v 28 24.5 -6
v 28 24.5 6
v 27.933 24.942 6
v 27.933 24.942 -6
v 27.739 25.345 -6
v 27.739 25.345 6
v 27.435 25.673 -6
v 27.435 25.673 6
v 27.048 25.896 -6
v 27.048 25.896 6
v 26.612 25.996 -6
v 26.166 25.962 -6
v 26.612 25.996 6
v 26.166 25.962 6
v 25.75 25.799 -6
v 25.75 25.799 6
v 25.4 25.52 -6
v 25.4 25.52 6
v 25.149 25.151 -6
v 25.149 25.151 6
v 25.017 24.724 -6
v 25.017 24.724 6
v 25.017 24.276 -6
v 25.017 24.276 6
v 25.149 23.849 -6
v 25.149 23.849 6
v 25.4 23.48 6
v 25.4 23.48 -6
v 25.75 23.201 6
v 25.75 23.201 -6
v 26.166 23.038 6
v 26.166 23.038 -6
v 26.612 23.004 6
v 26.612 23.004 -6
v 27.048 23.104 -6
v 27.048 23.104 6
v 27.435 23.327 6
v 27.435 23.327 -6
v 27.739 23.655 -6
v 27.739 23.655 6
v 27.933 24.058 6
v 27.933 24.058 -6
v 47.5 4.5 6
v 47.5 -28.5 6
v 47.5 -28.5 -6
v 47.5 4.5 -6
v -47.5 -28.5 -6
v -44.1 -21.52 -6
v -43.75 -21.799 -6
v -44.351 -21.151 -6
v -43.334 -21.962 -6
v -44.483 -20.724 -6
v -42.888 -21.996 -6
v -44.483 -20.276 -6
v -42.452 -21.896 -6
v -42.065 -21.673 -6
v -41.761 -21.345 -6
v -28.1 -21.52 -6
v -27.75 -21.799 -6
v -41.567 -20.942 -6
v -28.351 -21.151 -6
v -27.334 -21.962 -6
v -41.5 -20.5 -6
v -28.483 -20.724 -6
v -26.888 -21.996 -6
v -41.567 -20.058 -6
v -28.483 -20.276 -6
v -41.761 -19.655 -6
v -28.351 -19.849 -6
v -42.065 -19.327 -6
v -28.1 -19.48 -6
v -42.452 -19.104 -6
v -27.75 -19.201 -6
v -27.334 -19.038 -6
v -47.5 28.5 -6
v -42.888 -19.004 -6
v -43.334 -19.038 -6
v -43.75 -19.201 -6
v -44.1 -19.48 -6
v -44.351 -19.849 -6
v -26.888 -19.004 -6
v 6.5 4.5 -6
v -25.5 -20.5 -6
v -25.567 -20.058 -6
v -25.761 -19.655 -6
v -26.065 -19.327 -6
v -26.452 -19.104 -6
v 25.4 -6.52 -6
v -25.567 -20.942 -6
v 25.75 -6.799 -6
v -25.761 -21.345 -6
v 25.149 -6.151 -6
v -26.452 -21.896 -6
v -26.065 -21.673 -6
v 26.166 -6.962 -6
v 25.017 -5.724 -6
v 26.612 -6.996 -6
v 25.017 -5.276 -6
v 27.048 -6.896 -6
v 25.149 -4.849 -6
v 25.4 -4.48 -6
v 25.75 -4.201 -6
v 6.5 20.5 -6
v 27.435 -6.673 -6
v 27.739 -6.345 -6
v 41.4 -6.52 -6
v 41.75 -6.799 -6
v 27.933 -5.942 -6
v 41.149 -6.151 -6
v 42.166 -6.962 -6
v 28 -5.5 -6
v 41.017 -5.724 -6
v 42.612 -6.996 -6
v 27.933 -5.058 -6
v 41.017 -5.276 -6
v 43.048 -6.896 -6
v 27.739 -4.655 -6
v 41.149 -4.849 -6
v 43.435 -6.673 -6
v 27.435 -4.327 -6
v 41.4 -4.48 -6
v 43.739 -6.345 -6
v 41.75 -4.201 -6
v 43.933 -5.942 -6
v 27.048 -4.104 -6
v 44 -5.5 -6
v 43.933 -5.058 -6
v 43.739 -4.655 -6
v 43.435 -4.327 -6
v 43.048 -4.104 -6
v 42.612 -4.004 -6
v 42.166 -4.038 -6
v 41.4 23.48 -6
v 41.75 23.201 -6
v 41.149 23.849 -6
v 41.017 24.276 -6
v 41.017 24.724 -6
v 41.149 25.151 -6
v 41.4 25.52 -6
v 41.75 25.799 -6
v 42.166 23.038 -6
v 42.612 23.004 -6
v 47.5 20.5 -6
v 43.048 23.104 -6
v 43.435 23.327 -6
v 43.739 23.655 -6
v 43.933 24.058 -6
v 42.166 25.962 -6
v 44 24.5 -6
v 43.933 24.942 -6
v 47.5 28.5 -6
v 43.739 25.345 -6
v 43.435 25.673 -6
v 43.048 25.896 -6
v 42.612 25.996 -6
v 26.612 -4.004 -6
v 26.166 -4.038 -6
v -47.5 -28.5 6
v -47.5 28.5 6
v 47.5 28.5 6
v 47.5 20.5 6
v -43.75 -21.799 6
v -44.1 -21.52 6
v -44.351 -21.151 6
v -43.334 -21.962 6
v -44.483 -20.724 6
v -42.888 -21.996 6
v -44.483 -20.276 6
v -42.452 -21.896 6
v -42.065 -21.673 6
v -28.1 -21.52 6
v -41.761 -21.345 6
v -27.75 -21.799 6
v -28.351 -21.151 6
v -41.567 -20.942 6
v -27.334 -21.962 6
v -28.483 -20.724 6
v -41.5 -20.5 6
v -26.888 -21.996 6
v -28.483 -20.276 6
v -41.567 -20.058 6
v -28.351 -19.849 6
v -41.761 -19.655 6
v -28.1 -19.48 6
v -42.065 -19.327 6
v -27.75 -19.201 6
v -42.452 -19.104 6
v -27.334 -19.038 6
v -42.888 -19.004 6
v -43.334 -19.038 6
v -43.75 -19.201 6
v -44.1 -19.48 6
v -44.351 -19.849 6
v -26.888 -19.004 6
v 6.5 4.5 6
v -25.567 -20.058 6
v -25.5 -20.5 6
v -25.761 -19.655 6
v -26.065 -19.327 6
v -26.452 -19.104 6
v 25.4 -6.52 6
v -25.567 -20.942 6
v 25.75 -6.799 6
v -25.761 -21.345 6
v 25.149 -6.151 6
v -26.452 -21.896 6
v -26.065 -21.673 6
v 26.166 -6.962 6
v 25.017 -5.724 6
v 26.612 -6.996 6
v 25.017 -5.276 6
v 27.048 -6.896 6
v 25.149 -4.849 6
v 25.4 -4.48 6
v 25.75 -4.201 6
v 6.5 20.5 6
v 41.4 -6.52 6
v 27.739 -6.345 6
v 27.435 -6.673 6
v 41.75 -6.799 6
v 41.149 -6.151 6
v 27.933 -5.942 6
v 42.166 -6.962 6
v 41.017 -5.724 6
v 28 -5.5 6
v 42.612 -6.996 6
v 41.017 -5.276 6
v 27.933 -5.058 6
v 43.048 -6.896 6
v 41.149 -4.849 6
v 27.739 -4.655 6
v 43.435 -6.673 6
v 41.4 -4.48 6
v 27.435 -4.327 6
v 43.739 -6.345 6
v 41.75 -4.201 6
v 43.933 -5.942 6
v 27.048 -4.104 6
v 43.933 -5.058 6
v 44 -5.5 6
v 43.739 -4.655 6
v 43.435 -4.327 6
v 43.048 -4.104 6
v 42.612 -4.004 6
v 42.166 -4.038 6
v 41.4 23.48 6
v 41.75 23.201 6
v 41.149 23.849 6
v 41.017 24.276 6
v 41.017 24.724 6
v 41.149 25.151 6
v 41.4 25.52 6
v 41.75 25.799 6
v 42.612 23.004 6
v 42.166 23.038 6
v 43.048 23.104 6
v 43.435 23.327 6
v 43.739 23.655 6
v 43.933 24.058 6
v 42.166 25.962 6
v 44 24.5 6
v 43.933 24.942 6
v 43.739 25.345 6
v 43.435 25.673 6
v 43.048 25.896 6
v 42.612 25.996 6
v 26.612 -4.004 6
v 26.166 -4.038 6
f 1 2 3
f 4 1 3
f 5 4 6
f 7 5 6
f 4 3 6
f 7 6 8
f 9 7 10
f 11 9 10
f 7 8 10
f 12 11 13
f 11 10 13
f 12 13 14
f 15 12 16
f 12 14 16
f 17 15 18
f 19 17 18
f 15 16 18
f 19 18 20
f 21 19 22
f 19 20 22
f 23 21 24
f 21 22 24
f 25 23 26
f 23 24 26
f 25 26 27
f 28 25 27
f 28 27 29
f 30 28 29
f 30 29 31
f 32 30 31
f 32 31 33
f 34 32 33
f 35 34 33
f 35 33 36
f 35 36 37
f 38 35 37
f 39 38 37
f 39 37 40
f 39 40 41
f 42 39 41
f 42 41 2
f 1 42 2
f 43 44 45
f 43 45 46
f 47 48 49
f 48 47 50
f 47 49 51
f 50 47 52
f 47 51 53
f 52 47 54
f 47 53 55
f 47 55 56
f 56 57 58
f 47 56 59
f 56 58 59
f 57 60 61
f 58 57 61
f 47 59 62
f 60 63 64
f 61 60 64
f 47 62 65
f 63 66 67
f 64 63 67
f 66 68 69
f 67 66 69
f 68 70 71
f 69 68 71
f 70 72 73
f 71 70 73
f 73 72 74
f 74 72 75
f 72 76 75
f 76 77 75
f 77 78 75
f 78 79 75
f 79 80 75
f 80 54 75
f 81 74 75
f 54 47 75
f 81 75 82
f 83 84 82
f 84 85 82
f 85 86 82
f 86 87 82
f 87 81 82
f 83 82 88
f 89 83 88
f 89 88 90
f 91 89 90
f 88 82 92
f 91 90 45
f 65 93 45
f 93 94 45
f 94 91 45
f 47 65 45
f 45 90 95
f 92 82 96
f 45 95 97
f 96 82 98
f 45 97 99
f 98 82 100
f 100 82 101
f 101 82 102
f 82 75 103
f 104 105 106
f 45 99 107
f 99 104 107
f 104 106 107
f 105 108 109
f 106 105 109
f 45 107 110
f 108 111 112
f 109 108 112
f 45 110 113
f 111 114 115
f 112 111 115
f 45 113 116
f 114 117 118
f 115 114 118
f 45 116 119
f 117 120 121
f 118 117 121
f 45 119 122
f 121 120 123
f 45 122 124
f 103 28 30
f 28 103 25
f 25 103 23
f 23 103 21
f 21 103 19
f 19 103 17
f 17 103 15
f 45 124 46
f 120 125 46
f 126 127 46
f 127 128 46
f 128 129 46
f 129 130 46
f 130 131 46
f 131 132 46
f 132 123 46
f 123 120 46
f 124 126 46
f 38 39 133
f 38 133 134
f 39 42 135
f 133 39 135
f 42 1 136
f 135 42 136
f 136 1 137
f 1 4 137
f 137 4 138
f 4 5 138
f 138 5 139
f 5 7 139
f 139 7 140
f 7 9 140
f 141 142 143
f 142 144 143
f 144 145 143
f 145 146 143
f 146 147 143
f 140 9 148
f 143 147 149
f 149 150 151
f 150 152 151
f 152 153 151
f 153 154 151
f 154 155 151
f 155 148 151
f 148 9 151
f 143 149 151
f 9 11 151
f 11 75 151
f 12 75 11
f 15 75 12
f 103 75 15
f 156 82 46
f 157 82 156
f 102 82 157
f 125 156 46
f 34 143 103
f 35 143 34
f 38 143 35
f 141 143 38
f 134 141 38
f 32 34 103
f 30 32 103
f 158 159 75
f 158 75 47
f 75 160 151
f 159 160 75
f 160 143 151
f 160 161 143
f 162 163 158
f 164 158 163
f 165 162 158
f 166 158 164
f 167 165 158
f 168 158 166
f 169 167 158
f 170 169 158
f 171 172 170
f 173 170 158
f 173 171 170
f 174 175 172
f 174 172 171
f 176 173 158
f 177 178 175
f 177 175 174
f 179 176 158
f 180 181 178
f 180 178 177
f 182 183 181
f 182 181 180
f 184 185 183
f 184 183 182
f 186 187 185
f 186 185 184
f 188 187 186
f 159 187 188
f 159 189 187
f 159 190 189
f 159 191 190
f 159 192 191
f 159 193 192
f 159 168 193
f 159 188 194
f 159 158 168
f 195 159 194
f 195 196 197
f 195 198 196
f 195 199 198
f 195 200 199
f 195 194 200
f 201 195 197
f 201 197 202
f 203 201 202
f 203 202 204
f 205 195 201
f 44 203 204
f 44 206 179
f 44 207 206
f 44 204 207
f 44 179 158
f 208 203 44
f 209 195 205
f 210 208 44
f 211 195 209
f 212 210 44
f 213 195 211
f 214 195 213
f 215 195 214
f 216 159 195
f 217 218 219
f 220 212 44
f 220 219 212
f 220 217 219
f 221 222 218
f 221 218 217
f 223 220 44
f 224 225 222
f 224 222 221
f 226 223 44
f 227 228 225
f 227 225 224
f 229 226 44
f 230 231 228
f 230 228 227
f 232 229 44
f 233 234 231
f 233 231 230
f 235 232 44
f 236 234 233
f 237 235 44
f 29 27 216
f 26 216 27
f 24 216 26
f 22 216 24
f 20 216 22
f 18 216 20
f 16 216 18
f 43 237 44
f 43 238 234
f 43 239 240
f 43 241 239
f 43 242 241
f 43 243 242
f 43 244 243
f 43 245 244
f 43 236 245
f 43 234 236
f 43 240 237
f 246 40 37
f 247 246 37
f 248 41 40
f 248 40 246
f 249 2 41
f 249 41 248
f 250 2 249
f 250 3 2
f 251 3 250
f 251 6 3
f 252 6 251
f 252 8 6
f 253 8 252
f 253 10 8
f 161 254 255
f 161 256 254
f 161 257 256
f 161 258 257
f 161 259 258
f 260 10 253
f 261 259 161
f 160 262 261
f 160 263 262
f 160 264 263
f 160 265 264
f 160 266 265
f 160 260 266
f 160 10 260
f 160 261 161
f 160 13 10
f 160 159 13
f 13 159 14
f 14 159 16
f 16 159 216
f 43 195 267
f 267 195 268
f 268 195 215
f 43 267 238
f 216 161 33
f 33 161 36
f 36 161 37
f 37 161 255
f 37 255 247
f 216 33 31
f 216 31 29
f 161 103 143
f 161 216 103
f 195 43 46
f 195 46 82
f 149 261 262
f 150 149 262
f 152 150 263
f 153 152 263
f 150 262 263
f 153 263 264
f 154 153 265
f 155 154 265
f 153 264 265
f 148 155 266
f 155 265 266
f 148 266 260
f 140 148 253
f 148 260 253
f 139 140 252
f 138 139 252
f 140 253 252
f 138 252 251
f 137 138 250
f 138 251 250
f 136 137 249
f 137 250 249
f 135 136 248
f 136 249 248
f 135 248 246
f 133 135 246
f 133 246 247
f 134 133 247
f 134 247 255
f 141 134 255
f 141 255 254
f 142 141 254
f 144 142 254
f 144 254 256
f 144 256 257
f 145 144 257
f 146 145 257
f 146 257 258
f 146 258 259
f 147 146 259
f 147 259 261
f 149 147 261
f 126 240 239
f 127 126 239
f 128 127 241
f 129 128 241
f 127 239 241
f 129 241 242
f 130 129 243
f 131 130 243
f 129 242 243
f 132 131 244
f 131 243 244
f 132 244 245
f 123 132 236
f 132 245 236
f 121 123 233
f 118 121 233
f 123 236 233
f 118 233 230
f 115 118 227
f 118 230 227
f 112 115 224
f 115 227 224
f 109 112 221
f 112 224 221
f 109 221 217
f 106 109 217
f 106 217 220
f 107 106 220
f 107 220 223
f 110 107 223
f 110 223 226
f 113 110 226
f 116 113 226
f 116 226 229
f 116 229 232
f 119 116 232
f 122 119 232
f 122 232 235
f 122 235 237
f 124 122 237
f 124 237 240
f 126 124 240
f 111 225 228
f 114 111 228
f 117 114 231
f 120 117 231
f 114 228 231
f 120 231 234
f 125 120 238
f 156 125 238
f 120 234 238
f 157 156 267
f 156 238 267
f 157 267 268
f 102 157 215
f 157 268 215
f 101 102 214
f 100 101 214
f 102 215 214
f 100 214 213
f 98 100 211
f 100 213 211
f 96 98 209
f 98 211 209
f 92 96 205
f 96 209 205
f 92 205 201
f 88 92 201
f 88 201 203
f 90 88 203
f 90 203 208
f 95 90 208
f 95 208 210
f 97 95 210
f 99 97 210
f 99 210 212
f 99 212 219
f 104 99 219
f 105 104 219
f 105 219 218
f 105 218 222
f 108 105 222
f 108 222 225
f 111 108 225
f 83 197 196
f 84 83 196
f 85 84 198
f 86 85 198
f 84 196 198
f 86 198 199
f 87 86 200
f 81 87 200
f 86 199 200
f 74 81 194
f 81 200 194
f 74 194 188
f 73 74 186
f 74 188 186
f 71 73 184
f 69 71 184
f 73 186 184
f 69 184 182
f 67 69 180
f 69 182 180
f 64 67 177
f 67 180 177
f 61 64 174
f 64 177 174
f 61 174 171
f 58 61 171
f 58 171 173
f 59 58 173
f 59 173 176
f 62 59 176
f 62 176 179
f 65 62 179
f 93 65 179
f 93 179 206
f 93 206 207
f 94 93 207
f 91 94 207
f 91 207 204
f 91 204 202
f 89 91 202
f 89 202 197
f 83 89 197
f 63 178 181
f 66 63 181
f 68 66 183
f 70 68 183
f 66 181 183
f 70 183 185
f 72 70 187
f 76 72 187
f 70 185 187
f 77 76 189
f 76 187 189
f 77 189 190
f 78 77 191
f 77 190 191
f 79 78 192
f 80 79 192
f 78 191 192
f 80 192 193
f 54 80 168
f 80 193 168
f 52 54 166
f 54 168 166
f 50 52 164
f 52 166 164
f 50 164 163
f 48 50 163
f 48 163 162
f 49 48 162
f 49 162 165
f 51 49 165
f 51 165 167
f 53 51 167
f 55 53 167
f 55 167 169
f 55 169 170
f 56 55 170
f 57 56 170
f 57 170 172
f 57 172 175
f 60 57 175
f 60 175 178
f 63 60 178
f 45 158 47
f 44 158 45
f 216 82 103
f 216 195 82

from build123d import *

# Parameters (mm, degrees)
F1_DEPTH = 6
F2_R     = 1.5
F3_DEPTH = 25


with BuildPart() as f1:
    # F0 (on Top) → F1 (new body, symmetric)
    with BuildSketch(Plane.XY):
        Polygon((47.5, 20.5), (47.5, 28.5), (-47.5, 28.5), (-47.5, -28.5), (47.5, -28.5), (47.5, 4.5), (6.5, 4.5), (6.5, 20.5), align=None)
    extrude(amount=F1_DEPTH, both=True)

    # F2 (on face) → F3 (cut)
    with BuildSketch(Plane.XY.offset(6)):
        with Locations((-43, -20.5)):
            Circle(F2_R)
        with Locations((-27, -20.5)):
            Circle(F2_R)
        with Locations((26.5, -5.5)):
            Circle(F2_R)
        with Locations((42.5, -5.5)):
            Circle(F2_R)
        with Locations((42.5, 24.5)):
            Circle(F2_R)
        with Locations((26.5, 24.5)):
            Circle(F2_R)
    extrude(amount=-F3_DEPTH, mode=Mode.SUBTRACT)


solid = f1.part
